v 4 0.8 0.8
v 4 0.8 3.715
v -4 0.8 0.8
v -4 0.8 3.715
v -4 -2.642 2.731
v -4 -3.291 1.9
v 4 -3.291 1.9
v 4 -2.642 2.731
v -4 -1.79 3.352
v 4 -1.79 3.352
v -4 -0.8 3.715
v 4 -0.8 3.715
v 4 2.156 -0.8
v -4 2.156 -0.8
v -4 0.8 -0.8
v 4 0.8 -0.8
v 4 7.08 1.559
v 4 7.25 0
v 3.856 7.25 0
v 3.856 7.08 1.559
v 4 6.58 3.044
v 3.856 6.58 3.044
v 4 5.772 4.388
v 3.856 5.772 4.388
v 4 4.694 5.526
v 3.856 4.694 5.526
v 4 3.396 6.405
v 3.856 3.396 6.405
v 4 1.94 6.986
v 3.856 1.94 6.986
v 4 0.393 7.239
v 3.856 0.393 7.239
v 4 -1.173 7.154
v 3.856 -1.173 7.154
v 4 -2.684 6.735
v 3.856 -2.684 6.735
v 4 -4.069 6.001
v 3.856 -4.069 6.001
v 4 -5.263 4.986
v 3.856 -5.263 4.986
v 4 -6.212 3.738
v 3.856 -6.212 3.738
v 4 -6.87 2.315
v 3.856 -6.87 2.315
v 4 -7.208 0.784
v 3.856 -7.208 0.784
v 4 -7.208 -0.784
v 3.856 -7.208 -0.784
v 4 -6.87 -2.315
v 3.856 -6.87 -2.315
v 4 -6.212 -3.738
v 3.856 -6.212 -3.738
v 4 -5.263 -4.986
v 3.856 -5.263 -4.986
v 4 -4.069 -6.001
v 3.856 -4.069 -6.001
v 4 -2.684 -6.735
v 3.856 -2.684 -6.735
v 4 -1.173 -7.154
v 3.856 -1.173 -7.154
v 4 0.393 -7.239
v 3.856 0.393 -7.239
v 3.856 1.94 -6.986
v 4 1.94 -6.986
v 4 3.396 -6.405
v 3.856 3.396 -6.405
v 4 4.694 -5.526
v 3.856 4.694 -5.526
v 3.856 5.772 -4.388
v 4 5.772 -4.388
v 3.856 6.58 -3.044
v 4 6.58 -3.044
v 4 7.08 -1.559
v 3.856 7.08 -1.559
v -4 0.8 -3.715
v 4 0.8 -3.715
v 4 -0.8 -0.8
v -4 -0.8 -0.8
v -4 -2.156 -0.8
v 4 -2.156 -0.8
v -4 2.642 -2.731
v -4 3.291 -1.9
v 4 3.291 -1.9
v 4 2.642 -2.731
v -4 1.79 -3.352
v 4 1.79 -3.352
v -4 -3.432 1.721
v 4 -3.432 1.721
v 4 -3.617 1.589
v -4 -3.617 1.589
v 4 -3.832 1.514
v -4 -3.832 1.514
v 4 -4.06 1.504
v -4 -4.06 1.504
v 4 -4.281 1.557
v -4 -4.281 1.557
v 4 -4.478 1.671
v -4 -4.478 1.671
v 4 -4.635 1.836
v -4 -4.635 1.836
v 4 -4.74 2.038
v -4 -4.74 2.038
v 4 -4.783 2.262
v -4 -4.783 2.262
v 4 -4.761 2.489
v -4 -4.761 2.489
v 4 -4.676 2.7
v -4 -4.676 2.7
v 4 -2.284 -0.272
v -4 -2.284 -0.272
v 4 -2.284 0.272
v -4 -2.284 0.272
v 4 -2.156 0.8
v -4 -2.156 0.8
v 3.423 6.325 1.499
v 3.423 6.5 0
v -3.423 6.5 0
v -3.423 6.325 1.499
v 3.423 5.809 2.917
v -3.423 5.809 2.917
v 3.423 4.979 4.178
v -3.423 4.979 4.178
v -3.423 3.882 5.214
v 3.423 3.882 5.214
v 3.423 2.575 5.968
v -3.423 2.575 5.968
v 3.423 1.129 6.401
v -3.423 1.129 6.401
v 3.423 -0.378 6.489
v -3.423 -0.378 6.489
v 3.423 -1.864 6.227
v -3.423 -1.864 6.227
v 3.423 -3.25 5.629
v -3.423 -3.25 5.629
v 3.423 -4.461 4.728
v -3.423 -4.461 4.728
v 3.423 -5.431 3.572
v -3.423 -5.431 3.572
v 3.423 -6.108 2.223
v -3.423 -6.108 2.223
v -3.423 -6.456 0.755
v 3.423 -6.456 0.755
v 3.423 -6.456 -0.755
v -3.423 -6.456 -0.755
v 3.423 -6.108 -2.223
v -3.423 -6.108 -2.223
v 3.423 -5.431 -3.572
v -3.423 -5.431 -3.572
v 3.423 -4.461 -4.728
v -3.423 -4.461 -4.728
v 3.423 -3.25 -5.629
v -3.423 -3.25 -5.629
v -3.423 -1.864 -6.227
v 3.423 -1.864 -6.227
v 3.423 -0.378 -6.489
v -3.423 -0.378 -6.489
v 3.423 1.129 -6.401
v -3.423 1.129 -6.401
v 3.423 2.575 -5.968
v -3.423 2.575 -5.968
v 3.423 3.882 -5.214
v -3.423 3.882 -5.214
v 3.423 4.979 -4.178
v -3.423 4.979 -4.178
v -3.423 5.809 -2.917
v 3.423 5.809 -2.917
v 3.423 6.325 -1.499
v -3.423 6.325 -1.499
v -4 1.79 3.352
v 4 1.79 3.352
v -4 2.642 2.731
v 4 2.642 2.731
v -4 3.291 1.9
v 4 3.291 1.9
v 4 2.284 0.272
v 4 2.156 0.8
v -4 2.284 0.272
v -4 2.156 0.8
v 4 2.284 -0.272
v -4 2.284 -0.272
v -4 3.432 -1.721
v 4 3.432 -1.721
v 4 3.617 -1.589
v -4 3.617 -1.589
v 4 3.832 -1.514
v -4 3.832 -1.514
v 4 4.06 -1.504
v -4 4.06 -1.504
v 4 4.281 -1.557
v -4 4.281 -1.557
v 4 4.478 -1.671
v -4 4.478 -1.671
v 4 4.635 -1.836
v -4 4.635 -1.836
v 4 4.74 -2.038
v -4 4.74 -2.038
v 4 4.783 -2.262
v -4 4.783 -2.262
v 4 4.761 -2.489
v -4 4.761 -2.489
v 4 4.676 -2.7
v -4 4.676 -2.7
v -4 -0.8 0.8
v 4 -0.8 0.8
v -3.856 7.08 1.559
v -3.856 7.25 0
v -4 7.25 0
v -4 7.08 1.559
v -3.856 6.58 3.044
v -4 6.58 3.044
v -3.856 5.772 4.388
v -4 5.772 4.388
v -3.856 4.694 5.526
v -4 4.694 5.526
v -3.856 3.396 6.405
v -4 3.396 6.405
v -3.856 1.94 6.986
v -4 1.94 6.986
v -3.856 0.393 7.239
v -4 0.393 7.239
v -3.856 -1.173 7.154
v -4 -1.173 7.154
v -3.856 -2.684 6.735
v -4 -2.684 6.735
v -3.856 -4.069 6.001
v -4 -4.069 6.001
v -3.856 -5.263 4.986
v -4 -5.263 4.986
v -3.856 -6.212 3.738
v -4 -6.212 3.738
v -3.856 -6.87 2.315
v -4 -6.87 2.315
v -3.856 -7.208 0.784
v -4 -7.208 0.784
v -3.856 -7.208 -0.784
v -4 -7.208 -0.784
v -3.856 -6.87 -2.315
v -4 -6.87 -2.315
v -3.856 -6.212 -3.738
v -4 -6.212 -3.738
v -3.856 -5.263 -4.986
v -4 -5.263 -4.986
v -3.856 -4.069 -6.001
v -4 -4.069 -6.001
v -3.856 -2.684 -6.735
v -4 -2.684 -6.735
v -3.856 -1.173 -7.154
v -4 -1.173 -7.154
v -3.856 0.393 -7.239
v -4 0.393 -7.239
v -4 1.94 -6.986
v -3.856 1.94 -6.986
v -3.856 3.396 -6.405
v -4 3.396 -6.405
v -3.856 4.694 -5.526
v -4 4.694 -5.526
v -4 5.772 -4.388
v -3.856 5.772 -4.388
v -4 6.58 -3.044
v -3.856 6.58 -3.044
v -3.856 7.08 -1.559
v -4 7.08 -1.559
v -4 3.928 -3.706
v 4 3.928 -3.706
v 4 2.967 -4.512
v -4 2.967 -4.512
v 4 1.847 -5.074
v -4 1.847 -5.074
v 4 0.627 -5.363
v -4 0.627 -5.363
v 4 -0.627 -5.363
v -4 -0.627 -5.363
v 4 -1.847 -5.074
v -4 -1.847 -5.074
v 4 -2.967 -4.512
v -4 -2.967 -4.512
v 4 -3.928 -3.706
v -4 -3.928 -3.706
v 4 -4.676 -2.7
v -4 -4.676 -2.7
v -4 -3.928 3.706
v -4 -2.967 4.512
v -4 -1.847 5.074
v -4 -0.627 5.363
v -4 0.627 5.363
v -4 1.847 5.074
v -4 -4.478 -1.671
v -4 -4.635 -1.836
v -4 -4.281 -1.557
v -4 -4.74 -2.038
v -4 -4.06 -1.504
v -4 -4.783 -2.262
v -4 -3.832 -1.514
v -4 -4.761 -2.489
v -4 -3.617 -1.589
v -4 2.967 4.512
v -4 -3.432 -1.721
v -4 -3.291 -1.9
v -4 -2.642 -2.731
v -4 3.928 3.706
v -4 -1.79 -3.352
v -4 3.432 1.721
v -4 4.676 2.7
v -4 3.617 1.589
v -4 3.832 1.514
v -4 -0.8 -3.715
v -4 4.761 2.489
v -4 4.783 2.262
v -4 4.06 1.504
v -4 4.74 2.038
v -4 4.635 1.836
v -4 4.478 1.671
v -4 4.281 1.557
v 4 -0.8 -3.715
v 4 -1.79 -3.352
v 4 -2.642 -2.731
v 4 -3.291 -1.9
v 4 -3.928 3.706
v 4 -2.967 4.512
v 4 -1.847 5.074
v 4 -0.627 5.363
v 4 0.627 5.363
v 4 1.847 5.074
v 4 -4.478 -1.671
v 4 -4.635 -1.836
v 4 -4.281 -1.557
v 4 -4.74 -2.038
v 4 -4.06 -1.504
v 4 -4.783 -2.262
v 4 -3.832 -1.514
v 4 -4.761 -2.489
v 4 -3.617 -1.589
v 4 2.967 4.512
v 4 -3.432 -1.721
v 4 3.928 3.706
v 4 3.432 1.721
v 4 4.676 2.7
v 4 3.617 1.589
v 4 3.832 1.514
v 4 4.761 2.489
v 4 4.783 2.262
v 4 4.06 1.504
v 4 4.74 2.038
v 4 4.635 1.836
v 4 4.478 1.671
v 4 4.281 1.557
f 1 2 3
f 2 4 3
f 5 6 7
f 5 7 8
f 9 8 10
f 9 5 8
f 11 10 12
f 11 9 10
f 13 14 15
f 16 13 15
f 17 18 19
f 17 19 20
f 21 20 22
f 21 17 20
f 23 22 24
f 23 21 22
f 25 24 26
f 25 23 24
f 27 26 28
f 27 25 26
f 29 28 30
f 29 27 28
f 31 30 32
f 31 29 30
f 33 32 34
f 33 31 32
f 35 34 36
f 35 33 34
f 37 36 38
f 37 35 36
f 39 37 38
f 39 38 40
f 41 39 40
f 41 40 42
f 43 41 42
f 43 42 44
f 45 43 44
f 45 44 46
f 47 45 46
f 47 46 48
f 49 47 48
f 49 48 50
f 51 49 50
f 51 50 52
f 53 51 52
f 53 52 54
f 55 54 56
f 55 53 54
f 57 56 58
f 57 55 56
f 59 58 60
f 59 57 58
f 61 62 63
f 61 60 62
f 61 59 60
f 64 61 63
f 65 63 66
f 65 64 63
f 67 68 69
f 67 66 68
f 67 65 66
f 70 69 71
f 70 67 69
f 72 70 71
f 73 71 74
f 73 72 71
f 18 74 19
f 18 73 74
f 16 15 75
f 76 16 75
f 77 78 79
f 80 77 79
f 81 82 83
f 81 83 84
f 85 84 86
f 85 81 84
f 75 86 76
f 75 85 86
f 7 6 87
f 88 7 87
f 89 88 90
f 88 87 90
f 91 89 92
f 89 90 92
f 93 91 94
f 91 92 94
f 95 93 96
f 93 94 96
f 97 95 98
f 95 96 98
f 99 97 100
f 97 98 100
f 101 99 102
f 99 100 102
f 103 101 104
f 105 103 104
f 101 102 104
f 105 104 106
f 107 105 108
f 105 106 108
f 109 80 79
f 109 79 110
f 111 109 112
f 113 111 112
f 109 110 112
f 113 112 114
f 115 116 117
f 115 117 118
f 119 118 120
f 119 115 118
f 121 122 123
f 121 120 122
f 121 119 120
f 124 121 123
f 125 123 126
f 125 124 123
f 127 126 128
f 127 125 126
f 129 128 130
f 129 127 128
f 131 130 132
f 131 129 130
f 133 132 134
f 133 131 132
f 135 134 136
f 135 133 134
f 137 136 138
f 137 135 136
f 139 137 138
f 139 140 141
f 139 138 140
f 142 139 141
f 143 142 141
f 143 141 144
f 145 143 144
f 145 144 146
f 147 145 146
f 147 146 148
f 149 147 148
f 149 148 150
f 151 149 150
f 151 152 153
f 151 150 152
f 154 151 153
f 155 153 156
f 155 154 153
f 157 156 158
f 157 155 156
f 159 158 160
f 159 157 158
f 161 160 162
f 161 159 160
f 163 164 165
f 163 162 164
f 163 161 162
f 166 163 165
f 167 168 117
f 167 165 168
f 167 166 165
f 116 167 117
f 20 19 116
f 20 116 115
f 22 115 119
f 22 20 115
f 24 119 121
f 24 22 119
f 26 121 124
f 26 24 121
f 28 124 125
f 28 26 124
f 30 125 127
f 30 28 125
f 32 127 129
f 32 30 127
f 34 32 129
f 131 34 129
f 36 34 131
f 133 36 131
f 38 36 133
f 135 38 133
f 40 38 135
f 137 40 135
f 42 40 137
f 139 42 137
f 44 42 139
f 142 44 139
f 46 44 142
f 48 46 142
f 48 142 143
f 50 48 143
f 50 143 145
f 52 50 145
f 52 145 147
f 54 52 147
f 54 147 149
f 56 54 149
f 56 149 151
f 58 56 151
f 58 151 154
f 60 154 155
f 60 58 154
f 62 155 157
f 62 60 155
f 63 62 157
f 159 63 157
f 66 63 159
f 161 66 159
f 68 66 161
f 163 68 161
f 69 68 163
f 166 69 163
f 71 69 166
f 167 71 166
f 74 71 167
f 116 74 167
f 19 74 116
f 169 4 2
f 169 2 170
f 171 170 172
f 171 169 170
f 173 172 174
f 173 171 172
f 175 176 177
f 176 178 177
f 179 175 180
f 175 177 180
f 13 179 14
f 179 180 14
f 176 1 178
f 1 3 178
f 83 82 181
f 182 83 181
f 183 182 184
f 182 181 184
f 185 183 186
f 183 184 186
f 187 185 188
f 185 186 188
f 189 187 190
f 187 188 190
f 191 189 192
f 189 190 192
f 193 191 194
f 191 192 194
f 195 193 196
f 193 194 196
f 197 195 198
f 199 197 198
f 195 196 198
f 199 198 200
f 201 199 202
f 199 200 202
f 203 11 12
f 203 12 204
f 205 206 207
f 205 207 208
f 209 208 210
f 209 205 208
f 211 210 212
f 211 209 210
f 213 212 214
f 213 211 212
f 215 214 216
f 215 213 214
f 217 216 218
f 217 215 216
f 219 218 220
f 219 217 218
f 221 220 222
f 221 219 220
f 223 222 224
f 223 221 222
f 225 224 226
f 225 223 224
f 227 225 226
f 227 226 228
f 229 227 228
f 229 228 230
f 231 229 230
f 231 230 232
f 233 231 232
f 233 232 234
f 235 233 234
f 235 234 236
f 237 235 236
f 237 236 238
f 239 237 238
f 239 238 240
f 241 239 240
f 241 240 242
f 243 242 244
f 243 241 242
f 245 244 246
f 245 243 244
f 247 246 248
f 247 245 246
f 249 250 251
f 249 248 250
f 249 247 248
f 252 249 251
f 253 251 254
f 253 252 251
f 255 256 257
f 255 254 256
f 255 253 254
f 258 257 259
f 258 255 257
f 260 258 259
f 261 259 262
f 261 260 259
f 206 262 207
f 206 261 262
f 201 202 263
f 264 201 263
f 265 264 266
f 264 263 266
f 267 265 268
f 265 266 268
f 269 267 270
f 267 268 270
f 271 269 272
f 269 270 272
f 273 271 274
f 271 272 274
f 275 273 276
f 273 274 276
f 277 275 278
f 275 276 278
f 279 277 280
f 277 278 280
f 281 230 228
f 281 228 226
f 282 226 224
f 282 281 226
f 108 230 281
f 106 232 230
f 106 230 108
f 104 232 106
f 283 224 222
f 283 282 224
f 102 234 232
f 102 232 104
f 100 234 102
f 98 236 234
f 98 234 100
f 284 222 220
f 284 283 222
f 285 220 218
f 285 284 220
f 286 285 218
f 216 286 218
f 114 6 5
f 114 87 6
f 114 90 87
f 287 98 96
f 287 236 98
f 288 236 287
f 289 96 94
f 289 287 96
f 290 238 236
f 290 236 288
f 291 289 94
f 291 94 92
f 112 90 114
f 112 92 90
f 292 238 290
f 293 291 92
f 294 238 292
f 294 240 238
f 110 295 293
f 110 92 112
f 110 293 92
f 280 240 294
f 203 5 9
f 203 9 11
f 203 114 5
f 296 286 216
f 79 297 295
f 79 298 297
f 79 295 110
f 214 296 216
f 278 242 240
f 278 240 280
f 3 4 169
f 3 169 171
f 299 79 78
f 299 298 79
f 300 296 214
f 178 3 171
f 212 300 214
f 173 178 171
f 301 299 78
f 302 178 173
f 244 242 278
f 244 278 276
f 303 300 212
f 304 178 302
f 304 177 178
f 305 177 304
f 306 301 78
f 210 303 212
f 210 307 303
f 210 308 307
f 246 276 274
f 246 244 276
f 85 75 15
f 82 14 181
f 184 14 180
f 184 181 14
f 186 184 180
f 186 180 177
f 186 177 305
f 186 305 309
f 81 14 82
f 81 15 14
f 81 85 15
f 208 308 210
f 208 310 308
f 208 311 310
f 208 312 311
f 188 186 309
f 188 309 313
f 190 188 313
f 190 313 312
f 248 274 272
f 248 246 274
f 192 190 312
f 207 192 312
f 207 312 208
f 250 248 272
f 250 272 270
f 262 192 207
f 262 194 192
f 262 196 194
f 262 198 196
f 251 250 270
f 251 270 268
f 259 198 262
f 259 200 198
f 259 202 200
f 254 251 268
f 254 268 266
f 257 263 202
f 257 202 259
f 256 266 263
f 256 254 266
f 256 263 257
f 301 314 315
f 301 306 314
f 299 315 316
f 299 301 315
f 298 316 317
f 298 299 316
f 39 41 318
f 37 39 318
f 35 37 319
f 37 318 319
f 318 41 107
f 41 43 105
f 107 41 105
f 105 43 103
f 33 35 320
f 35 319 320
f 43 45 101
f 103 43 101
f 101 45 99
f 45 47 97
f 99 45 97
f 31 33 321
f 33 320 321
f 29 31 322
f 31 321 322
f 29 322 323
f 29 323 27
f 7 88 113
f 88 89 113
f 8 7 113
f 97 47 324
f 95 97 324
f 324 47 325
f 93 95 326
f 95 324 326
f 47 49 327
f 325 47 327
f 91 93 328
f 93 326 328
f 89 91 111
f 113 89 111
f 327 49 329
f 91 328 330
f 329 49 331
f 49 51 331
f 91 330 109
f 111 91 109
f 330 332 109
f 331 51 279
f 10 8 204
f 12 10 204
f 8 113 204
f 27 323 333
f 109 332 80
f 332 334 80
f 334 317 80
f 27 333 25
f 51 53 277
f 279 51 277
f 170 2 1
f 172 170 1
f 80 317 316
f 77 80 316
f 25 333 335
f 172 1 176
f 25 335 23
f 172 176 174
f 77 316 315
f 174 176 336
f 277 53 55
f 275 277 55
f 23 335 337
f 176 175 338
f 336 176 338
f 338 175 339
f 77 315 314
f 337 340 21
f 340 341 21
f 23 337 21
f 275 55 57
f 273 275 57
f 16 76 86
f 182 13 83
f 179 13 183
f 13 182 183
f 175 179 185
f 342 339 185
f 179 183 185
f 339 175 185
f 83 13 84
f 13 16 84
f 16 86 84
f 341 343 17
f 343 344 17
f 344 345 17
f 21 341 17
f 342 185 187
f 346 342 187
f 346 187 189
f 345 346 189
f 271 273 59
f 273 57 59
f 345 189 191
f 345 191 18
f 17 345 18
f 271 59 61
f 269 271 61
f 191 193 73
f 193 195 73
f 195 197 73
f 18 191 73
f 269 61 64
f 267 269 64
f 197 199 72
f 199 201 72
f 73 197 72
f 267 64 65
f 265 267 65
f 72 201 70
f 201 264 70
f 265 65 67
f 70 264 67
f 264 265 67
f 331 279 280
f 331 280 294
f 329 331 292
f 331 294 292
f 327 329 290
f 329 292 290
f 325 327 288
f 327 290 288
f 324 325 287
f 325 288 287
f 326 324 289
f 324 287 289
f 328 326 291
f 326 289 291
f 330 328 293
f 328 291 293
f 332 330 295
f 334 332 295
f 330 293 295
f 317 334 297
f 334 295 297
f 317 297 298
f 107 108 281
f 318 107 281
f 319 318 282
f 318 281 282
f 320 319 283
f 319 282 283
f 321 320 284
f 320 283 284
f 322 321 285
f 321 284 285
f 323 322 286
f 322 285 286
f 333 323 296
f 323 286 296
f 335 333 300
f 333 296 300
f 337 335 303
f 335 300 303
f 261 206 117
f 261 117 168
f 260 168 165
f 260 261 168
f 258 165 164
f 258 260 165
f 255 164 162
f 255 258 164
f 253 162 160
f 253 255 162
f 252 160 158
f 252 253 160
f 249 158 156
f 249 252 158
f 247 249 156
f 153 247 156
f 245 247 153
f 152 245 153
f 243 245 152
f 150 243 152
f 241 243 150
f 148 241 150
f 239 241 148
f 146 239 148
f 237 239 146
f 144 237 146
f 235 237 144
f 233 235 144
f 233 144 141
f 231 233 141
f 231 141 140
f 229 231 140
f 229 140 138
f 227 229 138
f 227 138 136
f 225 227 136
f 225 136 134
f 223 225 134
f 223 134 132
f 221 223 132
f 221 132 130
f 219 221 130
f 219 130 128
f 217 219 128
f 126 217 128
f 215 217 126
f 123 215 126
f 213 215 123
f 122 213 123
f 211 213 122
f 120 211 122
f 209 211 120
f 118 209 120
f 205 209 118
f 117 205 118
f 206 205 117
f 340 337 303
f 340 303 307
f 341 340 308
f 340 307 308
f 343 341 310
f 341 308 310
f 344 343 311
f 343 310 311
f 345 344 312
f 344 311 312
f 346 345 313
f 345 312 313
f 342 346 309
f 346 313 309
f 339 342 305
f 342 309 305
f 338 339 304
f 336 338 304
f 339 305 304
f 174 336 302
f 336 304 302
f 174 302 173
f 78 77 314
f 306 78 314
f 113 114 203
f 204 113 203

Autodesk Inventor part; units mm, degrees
ref_plane "YZ Plane" through (0, 0, 0) normal (1, 0, 0) x (0, 1, 0)
ref_plane "XZ Plane" through (0, 0, 0) normal (0, 1, 0) x (-1, 0, 0)
ref_plane "XY Plane" through (0, 0, 0) normal (0, 0, 1) x (1, 0, 0)
sketch "Sketch1" plane through (0, 0, 0) normal (0, 0, 1) x (1, 0, 0)
  line L0 (0, -1.5) -> (0, 9) construction
  line L1 (-4, 7.25) -> (-3.8557, 7.25)
  line L2 (-3.8557, 7.25) -> (-3.4226, 6.5)
  line L3 (-3.4226, 6.5) -> (3.4226, 6.5)
  line L4 (3.4226, 6.5) -> (3.8557, 7.25)
  line L5 (3.8557, 7.25) -> (4, 7.25)
  line L6 (4, 7.25) -> (4, 0)
  line L7 (4, 0) -> (-4, 0)
  line L8 (-4, 0) -> (-4, 7.25)
  point P0 (0, 0)
  point P1 (0, 6.5)
  point P2 (4, 7.5)
  dimension "d0" = 13
  dimension "d1" = 60
  dimension "d2" = 8
  dimension "d3" = 15
  dimension "d4" = 14.5
revolve "Revolution1" add sketch "Sketch1" angle 360 about axis through (4, 0, 0) along (-1, 0, 0)
sketch "Sketch2" plane through (0, 0, 0) normal (1, 0, 0) x (0, 1, 0)
  circle A0 centre (0, 0) radius 2.3
  line L0 (0.8, 2.1564) -> (0.8, 0.8)
  line L1 (0.8, -0.8) -> (0.8, -2.1564)
  line L2 (-2.1564, 0.8) -> (-0.8, 0.8)
  line L3 (0.8, 0.8) -> (2.1564, 0.8)
  line L4 (2.1564, -0.8) -> (0.8, -0.8)
  line L5 (-0.8, -0.8) -> (-2.1564, -0.8)
  line L6 (-0.8, 2.1564) -> (-0.8, 0.8)
  line L7 (-0.8, -0.8) -> (-0.8, -2.1564)
  dimension "d6" = 4.6
  dimension "d7" = 1.6
extrude "Extrusion1" cut sketch "Sketch2" along normal through all both and the other way through all contours A0 L4 L1 L7 L5 L2 L6 L0 L3
sketch "Sketch3" plane through (0, 0, 0) normal (1, 0, 0) x (0, 1, 0)
  circle A0 centre (0, 0) radius 2.3 construction
  arc A1 (3.2909, 1.9) -> (-3.2909, 1.9) centre (0, 0) ccw
  arc A2 (4.6765, 2.7) -> (-4.6765, 2.7) centre (0, 0) ccw
  arc A3 (-3.2909, -1.9) -> (3.2909, -1.9) centre (0, 0) ccw
  arc A4 (-4.6765, -2.7) -> (4.6765, -2.7) centre (0, 0) ccw
  arc A5 (3.2909, 1.9) -> (4.6765, 2.7) centre (3.9837, 2.3) ccw
  arc A6 (4.6765, -2.7) -> (3.2909, -1.9) centre (3.9837, -2.3) ccw
  arc A7 (-4.6765, 2.7) -> (-3.2909, 1.9) centre (-3.9837, 2.3) ccw
  arc A8 (-3.2909, -1.9) -> (-4.6765, -2.7) centre (-3.9837, -2.3) ccw
  line L0 (-3.9837, 2.3) -> (0, 0) construction
  line L1 (0, 0) -> (3.9837, 2.3) construction
  line L2 (3.9837, -2.3) -> (0, 0) construction
  line L3 (-3.9837, -2.3) -> (0, 0) construction
  line L4 (0, -6.16) -> (0, 6.16) construction
  line L5 (-5.8947, 0) -> (5.8947, 0) construction
  dimension "d10" = 1.6
  dimension "d11" = 120
  dimension "d12" = 120
  dimension "d15" = 3.8
extrude "Extrusion2" cut sketch "Sketch3" along normal through all both and the other way through all
sketch "Sketch4" plane through (0, 0, 0) normal (1, 0, 0) x (0, 1, 0)
  arc A0 (3.2909, 1.9) -> (-3.2909, 1.9) centre (0, 0) ccw projected
  arc A1 (-3.2909, -1.9) -> (3.2909, -1.9) centre (0, 0) ccw projected
  line L0 (0.8, -0.8) -> (0.8, -2.1564) construction
  line L1 (-0.8, -2.1564) -> (-0.8, -0.8) construction
  line L2 (0.8, 3.7148) -> (0.8, -3.7148)
  line L3 (-0.8, 3.7148) -> (-0.8, -3.7148)
extrude "Extrusion3" cut sketch "Sketch4" along normal through all both and the other way through all
properties part number "LEGO Brick 3482" material "Steel"
